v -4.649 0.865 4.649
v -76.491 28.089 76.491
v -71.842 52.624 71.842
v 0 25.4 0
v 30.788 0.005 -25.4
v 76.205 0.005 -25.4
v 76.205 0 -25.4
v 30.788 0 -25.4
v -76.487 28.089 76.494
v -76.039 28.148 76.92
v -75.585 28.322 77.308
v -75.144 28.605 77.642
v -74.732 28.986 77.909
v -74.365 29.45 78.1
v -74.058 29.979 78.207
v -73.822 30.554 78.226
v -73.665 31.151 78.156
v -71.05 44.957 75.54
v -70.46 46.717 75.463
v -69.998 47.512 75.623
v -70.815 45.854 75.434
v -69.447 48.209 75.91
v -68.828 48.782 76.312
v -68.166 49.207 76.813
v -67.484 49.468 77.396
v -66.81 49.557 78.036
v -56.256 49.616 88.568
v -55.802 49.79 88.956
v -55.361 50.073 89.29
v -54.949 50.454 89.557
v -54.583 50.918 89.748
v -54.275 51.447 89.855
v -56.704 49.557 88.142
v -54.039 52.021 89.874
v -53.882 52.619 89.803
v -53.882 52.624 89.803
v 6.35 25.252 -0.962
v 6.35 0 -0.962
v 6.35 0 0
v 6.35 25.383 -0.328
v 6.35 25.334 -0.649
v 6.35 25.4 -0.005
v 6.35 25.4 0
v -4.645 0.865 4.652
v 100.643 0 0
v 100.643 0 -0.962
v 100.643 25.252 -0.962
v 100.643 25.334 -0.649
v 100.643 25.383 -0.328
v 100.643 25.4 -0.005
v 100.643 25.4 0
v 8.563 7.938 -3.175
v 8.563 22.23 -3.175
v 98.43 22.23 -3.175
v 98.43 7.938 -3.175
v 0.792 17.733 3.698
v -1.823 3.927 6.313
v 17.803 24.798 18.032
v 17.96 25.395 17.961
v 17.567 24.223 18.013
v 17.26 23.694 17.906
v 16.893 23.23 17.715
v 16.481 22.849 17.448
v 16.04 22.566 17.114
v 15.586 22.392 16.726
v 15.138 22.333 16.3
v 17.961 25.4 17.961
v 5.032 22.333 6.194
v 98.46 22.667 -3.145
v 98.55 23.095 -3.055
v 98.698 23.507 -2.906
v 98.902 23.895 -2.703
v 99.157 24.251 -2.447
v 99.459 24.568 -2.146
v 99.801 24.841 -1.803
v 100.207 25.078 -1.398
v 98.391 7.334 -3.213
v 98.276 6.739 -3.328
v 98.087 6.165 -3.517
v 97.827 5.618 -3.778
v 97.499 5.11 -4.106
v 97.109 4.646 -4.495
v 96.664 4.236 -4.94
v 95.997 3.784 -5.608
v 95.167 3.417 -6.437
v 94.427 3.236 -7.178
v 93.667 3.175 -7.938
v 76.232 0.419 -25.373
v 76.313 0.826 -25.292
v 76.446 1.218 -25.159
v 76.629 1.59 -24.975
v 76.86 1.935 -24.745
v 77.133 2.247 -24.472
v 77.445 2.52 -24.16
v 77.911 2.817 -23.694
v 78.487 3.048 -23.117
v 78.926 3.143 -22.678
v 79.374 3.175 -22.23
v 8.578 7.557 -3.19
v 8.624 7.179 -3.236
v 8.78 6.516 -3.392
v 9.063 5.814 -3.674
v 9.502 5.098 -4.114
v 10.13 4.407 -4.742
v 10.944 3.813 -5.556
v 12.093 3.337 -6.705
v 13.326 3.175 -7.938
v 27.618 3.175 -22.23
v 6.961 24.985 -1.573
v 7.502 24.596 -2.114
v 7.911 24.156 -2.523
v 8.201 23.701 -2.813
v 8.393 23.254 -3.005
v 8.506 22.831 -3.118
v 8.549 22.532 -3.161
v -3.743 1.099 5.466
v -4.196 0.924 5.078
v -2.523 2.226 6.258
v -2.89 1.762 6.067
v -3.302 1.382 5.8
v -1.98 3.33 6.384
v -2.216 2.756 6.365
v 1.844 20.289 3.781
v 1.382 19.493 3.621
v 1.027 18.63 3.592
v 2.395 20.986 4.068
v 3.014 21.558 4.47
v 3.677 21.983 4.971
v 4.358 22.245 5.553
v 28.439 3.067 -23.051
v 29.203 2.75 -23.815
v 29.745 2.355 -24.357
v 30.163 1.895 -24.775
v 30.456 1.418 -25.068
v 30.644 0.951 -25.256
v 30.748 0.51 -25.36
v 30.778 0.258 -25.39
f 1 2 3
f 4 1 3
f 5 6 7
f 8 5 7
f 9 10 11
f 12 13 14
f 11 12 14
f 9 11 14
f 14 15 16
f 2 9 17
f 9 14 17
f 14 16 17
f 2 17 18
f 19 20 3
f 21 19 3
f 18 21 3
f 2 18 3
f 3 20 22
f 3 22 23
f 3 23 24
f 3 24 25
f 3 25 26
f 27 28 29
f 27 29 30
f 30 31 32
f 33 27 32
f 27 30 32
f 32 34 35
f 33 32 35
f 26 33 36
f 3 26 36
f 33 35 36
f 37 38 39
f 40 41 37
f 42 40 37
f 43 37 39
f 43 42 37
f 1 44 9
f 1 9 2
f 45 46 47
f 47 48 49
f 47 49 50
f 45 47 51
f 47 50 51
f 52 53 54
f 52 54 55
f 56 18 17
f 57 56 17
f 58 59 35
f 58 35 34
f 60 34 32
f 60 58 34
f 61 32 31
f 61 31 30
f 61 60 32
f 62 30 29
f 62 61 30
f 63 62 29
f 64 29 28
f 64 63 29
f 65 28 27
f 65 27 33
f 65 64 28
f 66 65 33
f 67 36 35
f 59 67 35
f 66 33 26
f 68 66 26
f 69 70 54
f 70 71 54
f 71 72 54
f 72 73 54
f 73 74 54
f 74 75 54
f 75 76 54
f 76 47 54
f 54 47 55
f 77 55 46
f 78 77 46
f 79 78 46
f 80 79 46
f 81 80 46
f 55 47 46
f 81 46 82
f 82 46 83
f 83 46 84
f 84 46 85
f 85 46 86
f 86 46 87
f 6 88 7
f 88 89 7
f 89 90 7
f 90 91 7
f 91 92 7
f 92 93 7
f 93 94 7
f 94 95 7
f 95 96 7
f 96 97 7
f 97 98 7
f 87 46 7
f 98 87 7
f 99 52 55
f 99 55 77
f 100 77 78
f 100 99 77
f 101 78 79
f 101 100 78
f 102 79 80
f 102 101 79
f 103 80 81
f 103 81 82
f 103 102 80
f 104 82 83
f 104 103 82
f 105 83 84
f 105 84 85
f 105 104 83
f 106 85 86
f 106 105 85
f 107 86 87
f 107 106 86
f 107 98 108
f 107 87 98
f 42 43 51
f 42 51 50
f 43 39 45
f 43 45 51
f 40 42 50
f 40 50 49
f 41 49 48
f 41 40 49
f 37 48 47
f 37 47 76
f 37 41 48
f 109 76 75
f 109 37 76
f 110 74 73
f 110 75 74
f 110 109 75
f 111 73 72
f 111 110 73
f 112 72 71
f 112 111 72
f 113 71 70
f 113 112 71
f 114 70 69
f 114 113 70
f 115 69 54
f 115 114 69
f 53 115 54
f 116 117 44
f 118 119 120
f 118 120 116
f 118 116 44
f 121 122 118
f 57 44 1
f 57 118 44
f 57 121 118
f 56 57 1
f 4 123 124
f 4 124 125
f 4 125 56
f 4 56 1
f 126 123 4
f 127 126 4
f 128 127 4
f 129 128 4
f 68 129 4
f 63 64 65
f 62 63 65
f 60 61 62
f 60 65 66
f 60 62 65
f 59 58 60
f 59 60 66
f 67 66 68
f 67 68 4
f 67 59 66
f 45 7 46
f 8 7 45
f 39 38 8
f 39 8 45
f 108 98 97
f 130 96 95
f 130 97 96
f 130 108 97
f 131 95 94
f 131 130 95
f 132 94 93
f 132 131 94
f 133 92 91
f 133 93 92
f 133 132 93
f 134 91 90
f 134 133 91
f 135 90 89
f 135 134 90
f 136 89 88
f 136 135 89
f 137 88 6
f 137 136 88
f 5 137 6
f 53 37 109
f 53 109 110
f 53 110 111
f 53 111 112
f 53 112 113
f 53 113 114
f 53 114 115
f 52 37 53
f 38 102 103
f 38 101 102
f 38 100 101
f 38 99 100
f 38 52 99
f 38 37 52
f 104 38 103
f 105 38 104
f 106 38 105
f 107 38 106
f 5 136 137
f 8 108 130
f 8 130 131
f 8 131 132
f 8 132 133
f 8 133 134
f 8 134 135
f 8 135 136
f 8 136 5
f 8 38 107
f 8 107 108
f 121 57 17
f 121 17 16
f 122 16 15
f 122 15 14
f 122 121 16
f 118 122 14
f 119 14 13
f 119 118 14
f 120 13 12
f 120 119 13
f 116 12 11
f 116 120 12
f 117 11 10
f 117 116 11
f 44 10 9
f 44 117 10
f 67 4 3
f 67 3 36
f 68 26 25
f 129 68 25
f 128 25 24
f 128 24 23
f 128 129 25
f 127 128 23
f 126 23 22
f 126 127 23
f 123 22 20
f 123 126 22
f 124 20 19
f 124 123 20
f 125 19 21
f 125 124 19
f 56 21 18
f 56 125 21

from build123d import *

# Parameters (mm, degrees)
STRUCTURAL_MEMBER1_DEPTH = 94.292689271
CUT_EXTRUDE2_DEPTH       = 107.86098869
STRUCTURAL_MEMBER4_DEPTH = 105.18405993


with BuildPart() as part:
    # Sketch1 → Structural Member1 (new body)
    with BuildSketch(Plane(origin=(6.35, 0, 0), x_dir=(0, 0, -1), z_dir=(1, 0, 0))):
        with BuildLine():
            Line((0, 0), (0, 25.4))
            Line((0, 25.4), (0.00508, 25.4))
            ThreePointArc((0.00508, 25.4), (2.246551928, 24.471551928), (3.175, 22.23008))
            Line((3.175, 22.23008), (3.175, 7.9375))
            ThreePointArc((3.175, 7.9375), (4.569903955, 4.569903955), (7.9375, 3.175))
            Line((7.9375, 3.175), (22.23008, 3.175))
            ThreePointArc((22.23008, 3.175), (24.471551928, 2.246551928), (25.4, 0.00508))
            Line((25.4, 0.00508), (25.4, 0))
            Line((25.4, 0), (0, 0))
        make_face()
    extrude(amount=STRUCTURAL_MEMBER1_DEPTH)

    # Sketch12 → Cut-Extrude2 (cut, through all)
    with BuildSketch(Plane(origin=(0, 0, 0), x_dir=(1, 0, 0), z_dir=(0, 1, 0))):
        Polygon((6.35, 25.4), (6.35, 6.35), (25.4, 25.4), align=None)
        Polygon((25.4, 25.4), (6.35, 6.35), (6.35, 0.961846327), (30.788153673, 25.4), align=None)
    cut_extrude2 = extrude(amount=CUT_EXTRUDE2_DEPTH, mode=Mode.SUBTRACT)

    # Mirror2: Cut-Extrude2 across plane
    add(cut_extrude2.mirror(Plane(origin=(53.496344636, 0, 0), x_dir=(0, 0, 1), z_dir=(1, 0, 0))), mode=Mode.SUBTRACT)


with BuildPart() as body_2:
    # Sketch17 → Structural Member4 (new body)
    with BuildSketch(Plane(origin=(0, 25.4, 0), x_dir=(-0.1830127018922193, -0.9659258262890682, 0.18301270189221994), z_dir=(-0.6830127018922181, 0.2588190451025212, 0.6830127018922205))):
        with BuildLine():
            Line((0, 0), (0, 25.4))
            Line((0, 25.4), (0.00508, 25.4))
            ThreePointArc((0.00508, 25.4), (2.246551928, 24.471551928), (3.175, 22.23008))
            Line((3.175, 22.23008), (3.175, 7.9375))
            ThreePointArc((3.175, 7.9375), (4.569903955, 4.569903955), (7.9375, 3.175))
            Line((7.9375, 3.175), (22.23008, 3.175))
            ThreePointArc((22.23008, 3.175), (24.471551928, 2.246551928), (25.4, 0.00508))
            Line((25.4, 0.00508), (25.4, 0))
            Line((25.4, 0), (0, 0))
        make_face()
    extrude(amount=STRUCTURAL_MEMBER4_DEPTH)


solid = Compound([part.part, body_2.part])
